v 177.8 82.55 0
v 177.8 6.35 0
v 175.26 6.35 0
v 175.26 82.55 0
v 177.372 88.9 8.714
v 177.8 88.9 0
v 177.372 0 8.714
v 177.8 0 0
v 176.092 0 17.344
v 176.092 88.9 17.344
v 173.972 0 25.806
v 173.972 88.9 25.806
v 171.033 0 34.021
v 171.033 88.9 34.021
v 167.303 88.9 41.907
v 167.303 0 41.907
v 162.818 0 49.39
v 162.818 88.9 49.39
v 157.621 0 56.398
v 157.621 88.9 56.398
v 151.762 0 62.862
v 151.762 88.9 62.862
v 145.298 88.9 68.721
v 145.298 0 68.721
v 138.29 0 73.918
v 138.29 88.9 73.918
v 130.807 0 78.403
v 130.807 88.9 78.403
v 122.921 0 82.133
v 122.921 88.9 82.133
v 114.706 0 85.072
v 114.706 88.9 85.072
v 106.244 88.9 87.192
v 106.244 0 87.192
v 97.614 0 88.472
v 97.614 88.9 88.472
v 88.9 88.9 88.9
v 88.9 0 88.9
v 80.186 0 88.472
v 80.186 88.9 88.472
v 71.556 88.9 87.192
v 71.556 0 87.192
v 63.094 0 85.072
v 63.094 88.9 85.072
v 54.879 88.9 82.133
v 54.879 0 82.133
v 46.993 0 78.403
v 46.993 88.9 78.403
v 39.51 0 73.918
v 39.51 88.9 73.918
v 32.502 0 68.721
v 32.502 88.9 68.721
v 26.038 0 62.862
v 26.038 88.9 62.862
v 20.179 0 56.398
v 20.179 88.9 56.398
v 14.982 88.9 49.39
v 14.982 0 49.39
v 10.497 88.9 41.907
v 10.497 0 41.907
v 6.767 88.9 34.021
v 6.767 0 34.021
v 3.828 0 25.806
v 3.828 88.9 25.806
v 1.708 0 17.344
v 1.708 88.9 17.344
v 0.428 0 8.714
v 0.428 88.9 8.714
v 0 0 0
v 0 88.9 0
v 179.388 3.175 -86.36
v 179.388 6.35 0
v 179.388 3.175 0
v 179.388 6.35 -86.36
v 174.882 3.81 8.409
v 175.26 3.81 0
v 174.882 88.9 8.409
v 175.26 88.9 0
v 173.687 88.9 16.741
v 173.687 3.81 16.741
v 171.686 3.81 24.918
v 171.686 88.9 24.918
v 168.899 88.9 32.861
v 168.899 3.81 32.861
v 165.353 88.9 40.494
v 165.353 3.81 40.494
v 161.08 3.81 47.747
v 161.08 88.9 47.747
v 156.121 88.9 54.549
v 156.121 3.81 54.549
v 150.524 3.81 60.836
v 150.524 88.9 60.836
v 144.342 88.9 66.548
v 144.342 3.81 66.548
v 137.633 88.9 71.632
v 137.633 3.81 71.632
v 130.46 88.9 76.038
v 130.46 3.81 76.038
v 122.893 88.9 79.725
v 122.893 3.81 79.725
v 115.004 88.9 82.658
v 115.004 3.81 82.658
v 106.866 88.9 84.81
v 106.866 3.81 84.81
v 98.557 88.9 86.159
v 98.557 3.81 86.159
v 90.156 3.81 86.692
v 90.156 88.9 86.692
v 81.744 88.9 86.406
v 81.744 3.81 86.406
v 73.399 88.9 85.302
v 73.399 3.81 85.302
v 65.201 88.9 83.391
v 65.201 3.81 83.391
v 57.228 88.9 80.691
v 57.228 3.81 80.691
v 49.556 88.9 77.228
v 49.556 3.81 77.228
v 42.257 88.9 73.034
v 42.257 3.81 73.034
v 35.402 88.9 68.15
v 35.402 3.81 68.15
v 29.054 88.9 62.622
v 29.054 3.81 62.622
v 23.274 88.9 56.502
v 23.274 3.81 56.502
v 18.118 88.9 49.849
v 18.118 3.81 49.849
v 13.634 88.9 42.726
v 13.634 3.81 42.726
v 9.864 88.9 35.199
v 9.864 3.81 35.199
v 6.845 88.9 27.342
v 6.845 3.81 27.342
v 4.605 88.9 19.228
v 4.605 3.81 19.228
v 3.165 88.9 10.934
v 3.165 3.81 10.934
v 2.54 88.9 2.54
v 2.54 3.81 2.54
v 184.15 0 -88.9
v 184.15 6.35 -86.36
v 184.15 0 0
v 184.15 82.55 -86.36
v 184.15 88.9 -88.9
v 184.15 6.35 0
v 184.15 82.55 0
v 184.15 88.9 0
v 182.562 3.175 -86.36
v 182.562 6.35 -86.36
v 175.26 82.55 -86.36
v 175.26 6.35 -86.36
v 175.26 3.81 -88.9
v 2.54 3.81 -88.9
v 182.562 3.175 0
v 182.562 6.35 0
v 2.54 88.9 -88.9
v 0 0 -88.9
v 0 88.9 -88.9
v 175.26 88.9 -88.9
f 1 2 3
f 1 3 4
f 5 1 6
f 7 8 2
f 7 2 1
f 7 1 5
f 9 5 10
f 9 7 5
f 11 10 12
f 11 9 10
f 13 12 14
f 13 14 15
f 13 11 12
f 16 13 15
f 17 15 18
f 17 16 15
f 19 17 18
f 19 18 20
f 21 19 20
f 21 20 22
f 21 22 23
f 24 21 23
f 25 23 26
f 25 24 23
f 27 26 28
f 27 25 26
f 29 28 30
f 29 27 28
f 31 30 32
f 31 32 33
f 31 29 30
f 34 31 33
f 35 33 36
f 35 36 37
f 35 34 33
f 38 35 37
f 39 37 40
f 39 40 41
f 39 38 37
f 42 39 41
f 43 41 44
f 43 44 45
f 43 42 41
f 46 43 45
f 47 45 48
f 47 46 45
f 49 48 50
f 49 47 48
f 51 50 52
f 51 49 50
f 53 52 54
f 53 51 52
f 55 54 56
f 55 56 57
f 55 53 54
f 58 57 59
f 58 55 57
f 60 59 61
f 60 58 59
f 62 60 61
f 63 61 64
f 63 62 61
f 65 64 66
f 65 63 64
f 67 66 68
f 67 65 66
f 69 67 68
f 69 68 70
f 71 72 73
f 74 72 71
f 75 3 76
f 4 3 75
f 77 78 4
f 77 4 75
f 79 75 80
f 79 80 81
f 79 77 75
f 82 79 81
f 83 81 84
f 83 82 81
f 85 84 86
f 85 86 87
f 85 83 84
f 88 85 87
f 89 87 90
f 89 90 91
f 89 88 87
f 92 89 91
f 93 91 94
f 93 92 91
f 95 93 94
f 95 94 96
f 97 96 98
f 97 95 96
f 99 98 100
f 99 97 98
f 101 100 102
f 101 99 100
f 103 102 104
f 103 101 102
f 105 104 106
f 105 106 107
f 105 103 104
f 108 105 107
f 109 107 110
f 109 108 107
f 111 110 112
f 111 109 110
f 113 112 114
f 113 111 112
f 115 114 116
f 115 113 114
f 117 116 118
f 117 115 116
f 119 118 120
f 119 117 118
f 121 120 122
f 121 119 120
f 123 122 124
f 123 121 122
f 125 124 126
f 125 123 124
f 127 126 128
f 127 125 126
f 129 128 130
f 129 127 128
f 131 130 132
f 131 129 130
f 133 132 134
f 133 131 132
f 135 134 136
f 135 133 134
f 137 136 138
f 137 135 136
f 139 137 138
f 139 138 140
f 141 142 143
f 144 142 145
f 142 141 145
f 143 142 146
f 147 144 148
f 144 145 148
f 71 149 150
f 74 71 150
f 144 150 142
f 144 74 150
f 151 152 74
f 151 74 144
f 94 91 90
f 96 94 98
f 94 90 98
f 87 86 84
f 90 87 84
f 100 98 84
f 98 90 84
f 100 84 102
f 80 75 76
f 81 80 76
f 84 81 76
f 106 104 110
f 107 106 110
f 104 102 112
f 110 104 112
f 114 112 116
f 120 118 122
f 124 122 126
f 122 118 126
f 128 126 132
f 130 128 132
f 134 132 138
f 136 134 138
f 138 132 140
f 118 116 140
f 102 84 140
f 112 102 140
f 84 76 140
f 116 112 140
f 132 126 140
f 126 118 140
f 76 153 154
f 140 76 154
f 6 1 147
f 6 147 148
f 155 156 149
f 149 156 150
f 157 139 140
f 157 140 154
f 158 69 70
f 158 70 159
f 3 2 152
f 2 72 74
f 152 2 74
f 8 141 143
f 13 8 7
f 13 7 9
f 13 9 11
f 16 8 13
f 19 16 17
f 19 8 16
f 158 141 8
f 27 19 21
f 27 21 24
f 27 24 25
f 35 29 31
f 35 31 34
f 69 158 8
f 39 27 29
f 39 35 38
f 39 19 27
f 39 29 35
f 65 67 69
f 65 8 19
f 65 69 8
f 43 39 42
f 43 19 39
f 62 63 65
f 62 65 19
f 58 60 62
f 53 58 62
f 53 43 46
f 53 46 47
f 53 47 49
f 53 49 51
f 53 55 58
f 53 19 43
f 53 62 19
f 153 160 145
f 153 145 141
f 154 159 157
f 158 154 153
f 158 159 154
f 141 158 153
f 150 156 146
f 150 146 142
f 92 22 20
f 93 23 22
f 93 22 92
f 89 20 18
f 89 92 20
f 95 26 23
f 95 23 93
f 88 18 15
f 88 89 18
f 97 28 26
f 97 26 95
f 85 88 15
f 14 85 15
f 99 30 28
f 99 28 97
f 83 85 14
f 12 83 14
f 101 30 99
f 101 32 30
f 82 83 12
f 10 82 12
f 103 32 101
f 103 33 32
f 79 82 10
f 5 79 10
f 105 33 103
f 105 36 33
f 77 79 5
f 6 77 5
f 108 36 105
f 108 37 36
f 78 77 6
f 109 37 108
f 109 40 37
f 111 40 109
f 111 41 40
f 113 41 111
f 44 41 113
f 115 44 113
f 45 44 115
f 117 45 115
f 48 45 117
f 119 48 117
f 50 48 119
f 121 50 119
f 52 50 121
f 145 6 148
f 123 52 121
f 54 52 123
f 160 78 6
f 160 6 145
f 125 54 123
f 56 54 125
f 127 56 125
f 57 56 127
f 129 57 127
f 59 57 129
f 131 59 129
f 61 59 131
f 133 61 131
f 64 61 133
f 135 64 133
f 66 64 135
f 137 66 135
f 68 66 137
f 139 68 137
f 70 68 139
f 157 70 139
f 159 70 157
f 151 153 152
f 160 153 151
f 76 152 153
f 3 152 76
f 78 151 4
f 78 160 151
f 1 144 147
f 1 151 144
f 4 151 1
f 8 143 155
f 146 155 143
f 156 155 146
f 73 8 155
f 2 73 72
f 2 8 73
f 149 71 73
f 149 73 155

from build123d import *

# Parameters (mm, degrees)
BOSS_EXTRUDE1_DEPTH = 88.9
CUT_EXTRUDE1_DEPTH  = 85.09
BOSS_EXTRUDE3_DEPTH = 6.35
SKETCH6_W           = 3.175
SKETCH6_H           = 86.36
CUT_EXTRUDE2_DEPTH  = 3.175
SKETCH7_W           = 86.36
SKETCH7_H           = 76.2
CUT_EXTRUDE3_DEPTH  = 2.54


with BuildPart() as part:
    # Sketch1 → Boss-Extrude1 (new body)
    with BuildSketch(Plane(origin=(0, 0, 0), x_dir=(1, 0, 0), z_dir=(0, 1, 0))):
        with BuildLine():
            Line((0, 0), (0, 88.9))
            Line((0, 88.9), (177.8, 88.9))
            Line((177.8, 88.9), (177.8, 0))
            ThreePointArc((177.8, 0), (88.9, -88.9), (0, 0))
        make_face()
    extrude(amount=BOSS_EXTRUDE1_DEPTH)

    # Sketch2 → Cut-Extrude1 (cut)
    with BuildSketch(Plane(origin=(0, 88.9, 0), x_dir=(1, 0, 0), z_dir=(0, 1, 0))):
        with BuildLine():
            Line((2.54, 88.9), (175.26, 88.9))
            Line((175.26, 88.9), (175.26, 0))
            ThreePointArc((175.26, 0), (90.15621165, -86.692392179), (2.54, -2.54))
            Line((2.54, -2.54), (2.54, 88.9))
        make_face()
    extrude(amount=-CUT_EXTRUDE1_DEPTH, mode=Mode.SUBTRACT)

    # Sketch4 → Boss-Extrude3 (add)
    with BuildSketch(Plane(origin=(177.8, 0, 0), x_dir=(0, 0, -1), z_dir=(1, 0, 0))):
        Polygon((0, 88.9), (88.9, 88.9), (88.9, 0), (0, 0), (0, 6.35), (86.36, 6.35), (86.36, 82.55), (0, 82.55), align=None)
    extrude(amount=BOSS_EXTRUDE3_DEPTH)

    # Sketch6 → Cut-Extrude2 (cut)
    with BuildSketch(Plane(origin=(0, 6.35, 0), x_dir=(1, 0, 0), z_dir=(0, 1, 0))):
        with Locations((180.975, 43.18)):
            Rectangle(SKETCH6_W, SKETCH6_H)
    extrude(amount=-CUT_EXTRUDE2_DEPTH, mode=Mode.SUBTRACT)

    # Sketch7 → Cut-Extrude3 (cut)
    with BuildSketch(Plane(origin=(177.8, 0, 0), x_dir=(0, 0, -1), z_dir=(1, 0, 0))):
        with Locations((43.18, 44.45)):
            Rectangle(SKETCH7_W, SKETCH7_H)
    extrude(amount=-CUT_EXTRUDE3_DEPTH, mode=Mode.SUBTRACT)


solid = part.part
